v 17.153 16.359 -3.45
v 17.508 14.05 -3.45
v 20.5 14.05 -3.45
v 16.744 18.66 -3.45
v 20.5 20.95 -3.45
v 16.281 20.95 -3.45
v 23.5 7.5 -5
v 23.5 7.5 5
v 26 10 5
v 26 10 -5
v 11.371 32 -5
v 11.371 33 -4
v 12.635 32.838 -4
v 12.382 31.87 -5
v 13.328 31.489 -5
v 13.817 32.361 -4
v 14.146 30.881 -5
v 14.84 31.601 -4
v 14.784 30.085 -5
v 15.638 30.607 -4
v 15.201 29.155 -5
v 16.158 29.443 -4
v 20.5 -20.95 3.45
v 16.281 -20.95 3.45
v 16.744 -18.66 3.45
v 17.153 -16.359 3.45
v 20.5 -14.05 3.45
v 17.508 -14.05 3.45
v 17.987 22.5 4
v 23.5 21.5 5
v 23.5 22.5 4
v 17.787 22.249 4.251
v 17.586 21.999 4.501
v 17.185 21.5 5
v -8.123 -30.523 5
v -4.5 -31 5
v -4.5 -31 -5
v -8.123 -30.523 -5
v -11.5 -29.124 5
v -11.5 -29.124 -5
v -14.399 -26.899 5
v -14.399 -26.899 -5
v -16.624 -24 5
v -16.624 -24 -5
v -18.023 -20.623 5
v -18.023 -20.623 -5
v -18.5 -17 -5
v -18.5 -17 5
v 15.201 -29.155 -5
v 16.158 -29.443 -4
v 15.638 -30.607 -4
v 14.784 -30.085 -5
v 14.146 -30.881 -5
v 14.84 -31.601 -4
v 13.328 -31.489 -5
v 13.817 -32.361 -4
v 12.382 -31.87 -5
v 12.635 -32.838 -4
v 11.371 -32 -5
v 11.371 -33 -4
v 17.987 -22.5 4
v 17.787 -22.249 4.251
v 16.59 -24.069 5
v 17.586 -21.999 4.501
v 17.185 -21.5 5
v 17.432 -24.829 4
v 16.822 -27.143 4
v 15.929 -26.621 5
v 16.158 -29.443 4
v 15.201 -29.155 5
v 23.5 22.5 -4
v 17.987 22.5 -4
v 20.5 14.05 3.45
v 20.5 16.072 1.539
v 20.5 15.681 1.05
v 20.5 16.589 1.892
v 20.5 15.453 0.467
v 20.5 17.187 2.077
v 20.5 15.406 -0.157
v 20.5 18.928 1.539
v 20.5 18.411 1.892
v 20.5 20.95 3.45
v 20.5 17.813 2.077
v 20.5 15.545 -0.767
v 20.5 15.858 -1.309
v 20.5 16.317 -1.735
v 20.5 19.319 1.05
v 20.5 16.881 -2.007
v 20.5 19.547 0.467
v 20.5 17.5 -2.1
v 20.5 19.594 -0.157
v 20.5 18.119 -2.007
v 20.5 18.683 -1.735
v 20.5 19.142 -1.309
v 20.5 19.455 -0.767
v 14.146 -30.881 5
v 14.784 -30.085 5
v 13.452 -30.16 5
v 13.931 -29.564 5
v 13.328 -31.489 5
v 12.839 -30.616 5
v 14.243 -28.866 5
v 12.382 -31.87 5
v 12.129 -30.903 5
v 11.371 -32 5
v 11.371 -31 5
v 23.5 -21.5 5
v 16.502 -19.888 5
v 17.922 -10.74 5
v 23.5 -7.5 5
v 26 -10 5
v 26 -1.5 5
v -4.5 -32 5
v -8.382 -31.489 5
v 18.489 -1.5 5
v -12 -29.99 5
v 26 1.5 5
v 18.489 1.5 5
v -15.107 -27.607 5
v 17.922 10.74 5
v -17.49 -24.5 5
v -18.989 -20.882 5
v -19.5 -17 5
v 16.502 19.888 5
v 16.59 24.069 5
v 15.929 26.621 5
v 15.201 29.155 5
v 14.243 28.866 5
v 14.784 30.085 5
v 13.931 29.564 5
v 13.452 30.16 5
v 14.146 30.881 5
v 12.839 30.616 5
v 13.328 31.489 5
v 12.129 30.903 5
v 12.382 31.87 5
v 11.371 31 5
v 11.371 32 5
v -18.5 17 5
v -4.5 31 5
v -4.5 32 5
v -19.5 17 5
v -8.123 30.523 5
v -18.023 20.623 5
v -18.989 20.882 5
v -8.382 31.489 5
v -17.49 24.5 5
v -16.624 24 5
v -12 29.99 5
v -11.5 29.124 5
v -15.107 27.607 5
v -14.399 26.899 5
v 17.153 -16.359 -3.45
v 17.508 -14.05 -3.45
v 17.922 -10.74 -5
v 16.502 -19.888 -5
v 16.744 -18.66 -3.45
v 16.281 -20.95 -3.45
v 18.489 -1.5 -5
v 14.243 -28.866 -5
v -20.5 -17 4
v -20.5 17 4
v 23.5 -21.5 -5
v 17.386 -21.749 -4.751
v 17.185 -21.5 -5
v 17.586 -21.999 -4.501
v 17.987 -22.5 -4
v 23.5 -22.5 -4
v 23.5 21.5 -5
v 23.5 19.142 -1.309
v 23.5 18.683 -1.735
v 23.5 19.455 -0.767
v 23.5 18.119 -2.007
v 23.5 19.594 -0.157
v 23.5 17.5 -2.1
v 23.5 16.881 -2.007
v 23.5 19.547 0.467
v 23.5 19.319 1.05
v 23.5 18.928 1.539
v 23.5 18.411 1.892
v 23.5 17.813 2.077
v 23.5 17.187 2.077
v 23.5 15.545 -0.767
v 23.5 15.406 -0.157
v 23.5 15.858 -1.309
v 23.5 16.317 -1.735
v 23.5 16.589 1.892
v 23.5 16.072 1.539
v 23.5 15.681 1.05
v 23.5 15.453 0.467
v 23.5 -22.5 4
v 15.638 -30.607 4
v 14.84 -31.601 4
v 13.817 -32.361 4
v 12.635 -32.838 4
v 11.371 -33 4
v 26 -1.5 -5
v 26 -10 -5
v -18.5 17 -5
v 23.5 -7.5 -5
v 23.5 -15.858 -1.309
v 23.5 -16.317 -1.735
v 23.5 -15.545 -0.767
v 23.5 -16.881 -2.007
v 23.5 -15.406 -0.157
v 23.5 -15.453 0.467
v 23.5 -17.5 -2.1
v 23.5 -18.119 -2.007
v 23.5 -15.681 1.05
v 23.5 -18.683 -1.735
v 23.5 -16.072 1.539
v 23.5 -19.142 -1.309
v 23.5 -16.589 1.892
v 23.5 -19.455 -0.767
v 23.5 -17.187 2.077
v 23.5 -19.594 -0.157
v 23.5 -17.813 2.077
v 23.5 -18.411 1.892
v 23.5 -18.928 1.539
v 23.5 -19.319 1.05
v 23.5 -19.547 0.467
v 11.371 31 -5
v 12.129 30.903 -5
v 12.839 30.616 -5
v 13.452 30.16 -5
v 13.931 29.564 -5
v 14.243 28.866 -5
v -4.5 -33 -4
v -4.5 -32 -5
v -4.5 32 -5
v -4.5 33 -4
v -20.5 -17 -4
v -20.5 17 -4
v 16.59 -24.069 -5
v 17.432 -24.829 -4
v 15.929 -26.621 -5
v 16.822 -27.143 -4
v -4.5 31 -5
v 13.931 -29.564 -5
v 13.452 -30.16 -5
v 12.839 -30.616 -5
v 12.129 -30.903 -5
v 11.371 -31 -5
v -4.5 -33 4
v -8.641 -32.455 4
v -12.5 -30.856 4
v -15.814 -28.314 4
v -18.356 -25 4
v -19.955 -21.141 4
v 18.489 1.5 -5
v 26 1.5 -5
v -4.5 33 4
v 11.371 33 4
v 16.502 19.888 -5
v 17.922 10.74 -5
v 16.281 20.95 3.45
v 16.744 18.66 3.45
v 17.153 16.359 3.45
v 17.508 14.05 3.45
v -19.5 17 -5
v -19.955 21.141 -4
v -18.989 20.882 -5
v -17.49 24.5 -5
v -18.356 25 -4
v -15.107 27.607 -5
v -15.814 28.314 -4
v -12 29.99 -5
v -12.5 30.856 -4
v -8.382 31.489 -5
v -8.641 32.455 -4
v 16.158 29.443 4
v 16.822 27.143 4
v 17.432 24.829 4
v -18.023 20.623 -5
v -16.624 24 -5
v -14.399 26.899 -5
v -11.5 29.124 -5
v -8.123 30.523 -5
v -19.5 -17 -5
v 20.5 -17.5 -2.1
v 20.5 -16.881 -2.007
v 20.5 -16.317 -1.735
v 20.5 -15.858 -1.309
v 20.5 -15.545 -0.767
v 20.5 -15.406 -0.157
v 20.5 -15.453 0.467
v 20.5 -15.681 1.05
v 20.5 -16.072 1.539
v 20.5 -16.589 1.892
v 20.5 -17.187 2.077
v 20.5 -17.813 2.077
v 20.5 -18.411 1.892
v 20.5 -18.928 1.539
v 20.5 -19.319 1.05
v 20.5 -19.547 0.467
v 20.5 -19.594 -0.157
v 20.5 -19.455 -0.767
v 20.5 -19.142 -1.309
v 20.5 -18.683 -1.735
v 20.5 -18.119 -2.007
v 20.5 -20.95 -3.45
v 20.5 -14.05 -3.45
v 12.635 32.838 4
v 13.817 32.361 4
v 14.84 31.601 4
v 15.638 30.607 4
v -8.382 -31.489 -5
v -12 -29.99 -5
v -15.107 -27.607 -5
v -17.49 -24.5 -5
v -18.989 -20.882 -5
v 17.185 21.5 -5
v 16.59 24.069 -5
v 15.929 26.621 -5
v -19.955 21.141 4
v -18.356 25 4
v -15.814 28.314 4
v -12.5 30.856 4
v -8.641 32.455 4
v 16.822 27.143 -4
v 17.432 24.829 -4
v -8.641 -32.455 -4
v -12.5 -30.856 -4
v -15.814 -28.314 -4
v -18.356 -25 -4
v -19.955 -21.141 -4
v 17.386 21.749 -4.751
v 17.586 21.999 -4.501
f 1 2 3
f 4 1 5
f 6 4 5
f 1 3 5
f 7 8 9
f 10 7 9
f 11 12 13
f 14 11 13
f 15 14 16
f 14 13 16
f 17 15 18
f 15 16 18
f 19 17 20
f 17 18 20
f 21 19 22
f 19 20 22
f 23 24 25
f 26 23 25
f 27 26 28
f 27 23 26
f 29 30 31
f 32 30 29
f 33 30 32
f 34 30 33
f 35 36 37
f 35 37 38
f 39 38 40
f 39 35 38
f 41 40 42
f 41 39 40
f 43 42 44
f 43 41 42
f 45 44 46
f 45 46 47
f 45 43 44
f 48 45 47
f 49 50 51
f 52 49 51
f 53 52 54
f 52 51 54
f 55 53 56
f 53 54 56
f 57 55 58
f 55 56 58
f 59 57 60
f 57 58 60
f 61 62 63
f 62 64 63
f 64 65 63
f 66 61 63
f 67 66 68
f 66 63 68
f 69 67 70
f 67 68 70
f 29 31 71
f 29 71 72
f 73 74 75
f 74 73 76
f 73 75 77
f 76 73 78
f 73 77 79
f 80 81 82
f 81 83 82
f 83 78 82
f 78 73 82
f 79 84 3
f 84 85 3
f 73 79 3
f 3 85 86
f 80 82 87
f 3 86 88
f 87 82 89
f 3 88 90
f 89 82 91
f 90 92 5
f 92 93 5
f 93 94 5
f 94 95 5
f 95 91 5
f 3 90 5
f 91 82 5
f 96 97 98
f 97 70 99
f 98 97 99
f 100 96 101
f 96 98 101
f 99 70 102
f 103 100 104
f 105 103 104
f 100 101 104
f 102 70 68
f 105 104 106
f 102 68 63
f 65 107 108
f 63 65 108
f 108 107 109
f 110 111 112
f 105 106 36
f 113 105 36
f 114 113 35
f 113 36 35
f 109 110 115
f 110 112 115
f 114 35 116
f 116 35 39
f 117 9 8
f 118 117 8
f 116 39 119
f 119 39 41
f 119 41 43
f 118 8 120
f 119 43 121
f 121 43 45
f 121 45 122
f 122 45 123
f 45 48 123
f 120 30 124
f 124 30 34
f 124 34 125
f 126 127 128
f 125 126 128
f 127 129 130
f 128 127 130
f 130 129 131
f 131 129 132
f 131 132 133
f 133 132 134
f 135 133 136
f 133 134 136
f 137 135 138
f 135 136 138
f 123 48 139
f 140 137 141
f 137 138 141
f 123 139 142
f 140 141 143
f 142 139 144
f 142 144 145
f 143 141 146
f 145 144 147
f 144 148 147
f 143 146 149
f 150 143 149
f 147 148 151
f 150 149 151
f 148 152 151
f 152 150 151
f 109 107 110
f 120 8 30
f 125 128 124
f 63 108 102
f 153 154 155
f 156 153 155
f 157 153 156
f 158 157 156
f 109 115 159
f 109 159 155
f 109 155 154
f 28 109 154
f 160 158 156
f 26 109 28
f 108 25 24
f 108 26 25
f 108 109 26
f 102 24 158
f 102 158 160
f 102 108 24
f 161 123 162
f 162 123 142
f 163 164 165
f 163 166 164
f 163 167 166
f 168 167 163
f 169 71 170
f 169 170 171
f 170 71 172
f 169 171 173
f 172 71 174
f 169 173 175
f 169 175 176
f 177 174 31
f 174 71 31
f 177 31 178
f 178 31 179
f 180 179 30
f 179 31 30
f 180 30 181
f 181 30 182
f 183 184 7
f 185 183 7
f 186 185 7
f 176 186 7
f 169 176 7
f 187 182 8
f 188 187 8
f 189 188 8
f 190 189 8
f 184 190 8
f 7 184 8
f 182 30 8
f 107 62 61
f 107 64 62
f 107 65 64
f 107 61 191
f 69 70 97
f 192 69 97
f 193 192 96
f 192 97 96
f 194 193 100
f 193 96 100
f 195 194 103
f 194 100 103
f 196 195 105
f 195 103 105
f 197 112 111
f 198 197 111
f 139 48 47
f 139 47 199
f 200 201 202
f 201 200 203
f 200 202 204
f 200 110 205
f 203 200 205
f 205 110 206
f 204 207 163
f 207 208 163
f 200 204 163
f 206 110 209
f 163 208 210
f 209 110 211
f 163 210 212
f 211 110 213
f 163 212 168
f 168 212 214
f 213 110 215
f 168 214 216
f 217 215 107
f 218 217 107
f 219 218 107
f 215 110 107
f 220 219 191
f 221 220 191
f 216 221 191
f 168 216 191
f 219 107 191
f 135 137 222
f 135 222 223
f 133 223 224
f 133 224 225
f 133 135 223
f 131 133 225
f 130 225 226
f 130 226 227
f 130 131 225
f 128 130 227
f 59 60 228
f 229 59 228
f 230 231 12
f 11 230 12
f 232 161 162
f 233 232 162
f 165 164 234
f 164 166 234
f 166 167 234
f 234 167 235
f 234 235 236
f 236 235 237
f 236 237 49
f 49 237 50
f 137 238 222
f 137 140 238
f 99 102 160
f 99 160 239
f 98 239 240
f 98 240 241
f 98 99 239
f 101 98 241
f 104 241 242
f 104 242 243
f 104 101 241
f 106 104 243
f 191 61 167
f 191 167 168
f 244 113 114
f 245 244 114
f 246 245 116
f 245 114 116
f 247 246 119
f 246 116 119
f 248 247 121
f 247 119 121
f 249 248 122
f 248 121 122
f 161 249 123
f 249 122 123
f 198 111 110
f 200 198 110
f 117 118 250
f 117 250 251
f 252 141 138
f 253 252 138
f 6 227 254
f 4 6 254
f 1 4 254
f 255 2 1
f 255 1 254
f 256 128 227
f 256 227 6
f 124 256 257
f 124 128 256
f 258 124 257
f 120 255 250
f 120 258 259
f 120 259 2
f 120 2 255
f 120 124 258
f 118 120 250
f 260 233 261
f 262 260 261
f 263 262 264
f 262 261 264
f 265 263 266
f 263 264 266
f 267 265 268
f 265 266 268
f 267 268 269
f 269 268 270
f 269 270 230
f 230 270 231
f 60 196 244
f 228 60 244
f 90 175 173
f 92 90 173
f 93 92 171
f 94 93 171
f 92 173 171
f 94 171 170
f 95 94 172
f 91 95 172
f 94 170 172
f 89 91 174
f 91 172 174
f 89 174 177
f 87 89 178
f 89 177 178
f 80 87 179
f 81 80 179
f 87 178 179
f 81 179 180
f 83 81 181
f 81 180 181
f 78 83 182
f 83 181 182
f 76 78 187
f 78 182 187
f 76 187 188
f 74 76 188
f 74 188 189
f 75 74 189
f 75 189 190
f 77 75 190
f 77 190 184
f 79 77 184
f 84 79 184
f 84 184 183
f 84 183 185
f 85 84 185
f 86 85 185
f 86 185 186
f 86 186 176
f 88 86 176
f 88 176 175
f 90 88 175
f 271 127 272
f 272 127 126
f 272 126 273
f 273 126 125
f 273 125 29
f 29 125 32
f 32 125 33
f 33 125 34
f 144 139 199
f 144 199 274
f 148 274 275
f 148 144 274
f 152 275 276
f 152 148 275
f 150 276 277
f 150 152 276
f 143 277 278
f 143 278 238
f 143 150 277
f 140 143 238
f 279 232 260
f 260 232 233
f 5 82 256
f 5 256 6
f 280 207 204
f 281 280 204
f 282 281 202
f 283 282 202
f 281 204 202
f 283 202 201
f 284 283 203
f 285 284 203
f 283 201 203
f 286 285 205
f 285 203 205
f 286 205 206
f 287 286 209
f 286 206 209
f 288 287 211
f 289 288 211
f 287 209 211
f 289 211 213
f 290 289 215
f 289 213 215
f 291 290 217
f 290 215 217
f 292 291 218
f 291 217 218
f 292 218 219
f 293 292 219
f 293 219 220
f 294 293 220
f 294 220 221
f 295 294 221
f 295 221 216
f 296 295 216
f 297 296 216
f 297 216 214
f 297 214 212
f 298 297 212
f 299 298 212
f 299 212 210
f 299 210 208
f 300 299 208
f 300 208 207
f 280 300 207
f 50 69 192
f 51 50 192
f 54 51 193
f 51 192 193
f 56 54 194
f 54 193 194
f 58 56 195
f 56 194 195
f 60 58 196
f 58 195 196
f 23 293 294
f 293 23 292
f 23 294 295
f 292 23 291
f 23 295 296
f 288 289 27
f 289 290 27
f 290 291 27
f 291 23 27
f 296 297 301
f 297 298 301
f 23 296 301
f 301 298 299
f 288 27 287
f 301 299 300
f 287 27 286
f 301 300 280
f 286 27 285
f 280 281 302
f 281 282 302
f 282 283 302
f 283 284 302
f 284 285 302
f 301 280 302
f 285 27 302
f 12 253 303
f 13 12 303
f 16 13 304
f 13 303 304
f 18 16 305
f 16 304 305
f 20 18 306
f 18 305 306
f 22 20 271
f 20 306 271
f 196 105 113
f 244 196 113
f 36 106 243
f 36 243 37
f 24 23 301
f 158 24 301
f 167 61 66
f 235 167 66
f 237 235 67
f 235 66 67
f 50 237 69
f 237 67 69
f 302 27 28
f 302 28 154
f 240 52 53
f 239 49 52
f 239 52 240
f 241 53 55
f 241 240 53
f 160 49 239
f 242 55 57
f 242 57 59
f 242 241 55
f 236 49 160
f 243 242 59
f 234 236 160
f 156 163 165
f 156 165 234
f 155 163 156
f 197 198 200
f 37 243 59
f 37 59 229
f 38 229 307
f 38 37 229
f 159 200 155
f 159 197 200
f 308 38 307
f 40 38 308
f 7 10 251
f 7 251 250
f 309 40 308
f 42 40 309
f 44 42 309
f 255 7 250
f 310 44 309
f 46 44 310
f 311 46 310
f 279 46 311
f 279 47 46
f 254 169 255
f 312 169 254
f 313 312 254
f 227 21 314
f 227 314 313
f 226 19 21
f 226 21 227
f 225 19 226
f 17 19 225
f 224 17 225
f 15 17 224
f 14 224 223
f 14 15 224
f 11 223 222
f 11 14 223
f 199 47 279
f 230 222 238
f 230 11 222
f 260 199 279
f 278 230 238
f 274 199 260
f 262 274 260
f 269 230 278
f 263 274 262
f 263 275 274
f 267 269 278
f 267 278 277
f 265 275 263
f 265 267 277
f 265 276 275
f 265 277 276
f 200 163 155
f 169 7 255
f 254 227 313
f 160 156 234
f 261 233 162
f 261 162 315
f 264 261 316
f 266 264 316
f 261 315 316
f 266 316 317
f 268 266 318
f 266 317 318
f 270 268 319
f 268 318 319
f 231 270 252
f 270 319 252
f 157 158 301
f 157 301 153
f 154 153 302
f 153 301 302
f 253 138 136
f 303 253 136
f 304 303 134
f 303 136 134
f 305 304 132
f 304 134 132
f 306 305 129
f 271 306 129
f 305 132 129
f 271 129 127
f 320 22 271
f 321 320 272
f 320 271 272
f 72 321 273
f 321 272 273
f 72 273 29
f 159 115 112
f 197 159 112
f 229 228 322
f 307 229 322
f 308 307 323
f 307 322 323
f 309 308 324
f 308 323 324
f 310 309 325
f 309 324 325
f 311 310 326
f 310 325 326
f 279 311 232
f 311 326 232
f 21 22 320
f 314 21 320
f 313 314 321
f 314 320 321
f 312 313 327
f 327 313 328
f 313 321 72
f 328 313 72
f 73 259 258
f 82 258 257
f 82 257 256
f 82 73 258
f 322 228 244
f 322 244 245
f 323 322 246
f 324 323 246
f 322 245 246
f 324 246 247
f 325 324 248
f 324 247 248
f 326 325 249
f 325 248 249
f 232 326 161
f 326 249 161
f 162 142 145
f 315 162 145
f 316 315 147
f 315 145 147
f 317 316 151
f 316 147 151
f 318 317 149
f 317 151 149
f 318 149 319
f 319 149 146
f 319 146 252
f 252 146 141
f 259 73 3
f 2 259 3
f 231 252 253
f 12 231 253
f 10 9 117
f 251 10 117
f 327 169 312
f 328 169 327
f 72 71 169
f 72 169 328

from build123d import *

# Parameters (mm, degrees)
SALIENTE_EXTRUIR1_DEPTH = 5
SALIENTE_EXTRUIR2_DEPTH = 10
CORTAR_EXTRUIR1_DEPTH   = 11
CROQUIS4_W              = 15
CROQUIS4_H              = 3
CORTAR_EXTRUIR2_DEPTH   = 11
CORTAR_EXTRUIR3_REACH   = 46
CROQUIS6_R              = 2.1
CORTAR_EXTRUIR4_REACH   = 49
CORTAR_EXTRUIR4_START   = -3
CROQUIS7_W              = 6.9
CROQUIS7_H              = 6.9
CHAFL_N1_SIZE           = 1


with BuildPart() as part:
    # Croquis1 → Saliente-Extruir1 (new body, symmetric)
    with BuildSketch(Plane.XY):
        with BuildLine():
            Line((-20.5, -17), (-20.5, 17))
            ThreePointArc((-20.5, 17), (-15.813708499, 28.313708499), (-4.5, 33))
            Line((-4.5, 33), (11.370878105, 33))
            ThreePointArc((11.370878105, 33), (14.352782292, 32.013508119), (16.15803677, 29.443298969))
            ThreePointArc((16.15803677, 29.443298969), (20.5, 0), (16.15803677, -29.443298969))
            ThreePointArc((16.15803677, -29.443298969), (14.352782292, -32.013508119), (11.370878105, -33))
            Line((11.370878105, -33), (-4.5, -33))
            ThreePointArc((-4.5, -33), (-15.813708499, -28.313708499), (-20.5, -17))
        make_face()
        with BuildLine():
            Line((-4.5, 31), (11.370878105, 31))
            ThreePointArc((11.370878105, 31), (13.160020617, 30.408104872), (14.243173304, 28.865979381))
            ThreePointArc((14.243173304, 28.865979381), (18.5, 0), (14.243173304, -28.865979381))
            ThreePointArc((14.243173304, -28.865979381), (13.160020617, -30.408104872), (11.370878105, -31))
            Line((11.370878105, -31), (-4.5, -31))
            ThreePointArc((-4.5, -31), (-14.399494937, -26.899494937), (-18.5, -17))
            Line((-18.5, -17), (-18.5, 17))
            ThreePointArc((-18.5, 17), (-14.399494937, 26.899494937), (-4.5, 31))
        make_face(mode=Mode.SUBTRACT)
    extrude(amount=SALIENTE_EXTRUIR1_DEPTH, both=True)

    # Croquis2 → Saliente-Extruir2 (add, through all)
    with BuildSketch(Plane.XY.offset(5)):
        Polygon((18.5, 22.5), (17.987436393, 22.5), (20.5, 0), (17.987436393, -22.5), (18.5, -22.5), (28.5, -22.5), (28.5, 22.5), align=None)
    extrude(amount=-SALIENTE_EXTRUIR2_DEPTH)

    # Croquis3 → Cortar-Extruir1 (cut, through all)
    with BuildSketch(Plane.XY.offset(5)):
        Polygon((23.5, 22.5), (23.5, 7.5), (26, 10), (26, -10), (23.5, -7.5), (23.5, -22.5), (28.5, -22.5), (28.5, 22.5), align=None)
    extrude(amount=-CORTAR_EXTRUIR1_DEPTH, mode=Mode.SUBTRACT)

    # Croquis4 → Cortar-Extruir2 (cut, through all)
    with BuildSketch(Plane.XY.offset(5)):
        with Locations((18.5, 0)):
            Rectangle(CROQUIS4_W, CROQUIS4_H)
    extrude(amount=-CORTAR_EXTRUIR2_DEPTH, mode=Mode.SUBTRACT)

    # Croquis6 → Cortar-Extruir3 (cut, up to next)
    with BuildSketch(Plane(origin=(23.5, 0, 0), x_dir=(0, 0, -1), z_dir=(1, 0, 0)), mode=Mode.PRIVATE) as cortar_extruir3_sk1:
        with Locations((0, 17.5)):
            Circle(CROQUIS6_R)
    cortar_extruir3_tool1 = extrude(cortar_extruir3_sk1.sketch, amount=-CORTAR_EXTRUIR3_REACH, mode=Mode.PRIVATE) & part.part
    add(cortar_extruir3_tool1.solids().sort_by_distance((23.5, 17.5, 0))[0], mode=Mode.SUBTRACT)
    # Croquis6 → Cortar-Extruir3 (cut, up to next)
    with BuildSketch(Plane(origin=(23.5, 0, 0), x_dir=(0, 0, -1), z_dir=(1, 0, 0)), mode=Mode.PRIVATE) as cortar_extruir3_sk2:
        with Locations((0, -17.5)):
            Circle(CROQUIS6_R)
    cortar_extruir3_tool2 = extrude(cortar_extruir3_sk2.sketch, amount=-CORTAR_EXTRUIR3_REACH, mode=Mode.PRIVATE) & part.part
    add(cortar_extruir3_tool2.solids().sort_by_distance((23.5, -17.5, 0))[0], mode=Mode.SUBTRACT)

    # Croquis7 → Cortar-Extruir4 (cut, up to next)
    with BuildSketch(Plane(origin=(23.5, 0, 0), x_dir=(0, 0, -1), z_dir=(1, 0, 0)).offset(CORTAR_EXTRUIR4_START), mode=Mode.PRIVATE) as cortar_extruir4_sk1:
        with Locations((0, 17.5)):
            Rectangle(CROQUIS7_W, CROQUIS7_H)
    cortar_extruir4_tool1 = extrude(cortar_extruir4_sk1.sketch, amount=-CORTAR_EXTRUIR4_REACH, mode=Mode.PRIVATE) & part.part
    add(cortar_extruir4_tool1.solids().sort_by_distance((20.5, 17.5, 0))[0], mode=Mode.SUBTRACT)
    # Croquis7 → Cortar-Extruir4 (cut, up to next)
    with BuildSketch(Plane(origin=(23.5, 0, 0), x_dir=(0, 0, -1), z_dir=(1, 0, 0)).offset(CORTAR_EXTRUIR4_START), mode=Mode.PRIVATE) as cortar_extruir4_sk2:
        with Locations((0, -17.5)):
            Rectangle(CROQUIS7_W, CROQUIS7_H)
    cortar_extruir4_tool2 = extrude(cortar_extruir4_sk2.sketch, amount=-CORTAR_EXTRUIR4_REACH, mode=Mode.PRIVATE) & part.part
    add(cortar_extruir4_tool2.solids().sort_by_distance((20.5, -17.5, 0))[0], mode=Mode.SUBTRACT)

    # Chaflán1
    chafl_n1_edges = [part.edges().sort_by_distance(p)[0] for p in [
        (3.435439053, -33, -5),
        (-15.813708499, -28.313708499, -5),
        (-20.5, 0, -5),
        (-15.813708499, 28.313708499, -5),
        (-15.813708499, -28.313708499, 5),
        (3.435439053, -33, 5),
        (14.352782292, -32.013508119, 5),
        (17.133851934, -25.987751975, 5),
        (14.352782292, 32.013508119, 5),
        (3.435439053, 33, 5),
        (-15.813708499, 28.313708499, 5),
        (17.133851934, 25.987751975, -5),
        (17.133851934, 25.987751975, 5),
        (20.743718196, -22.5, -5),
        (20.743718196, -22.5, 5),
        (20.743718196, 22.5, 5),
        (20.743718196, 22.5, -5),
        (3.435439053, 33, -5),
        (-20.5, 0, 5),
        (14.352782292, 32.013508119, -5),
        (17.133851934, -25.987751975, -5),
        (14.352782292, -32.013508119, -5),
    ]]
    chamfer(chafl_n1_edges, length=CHAFL_N1_SIZE)


solid = part.part
